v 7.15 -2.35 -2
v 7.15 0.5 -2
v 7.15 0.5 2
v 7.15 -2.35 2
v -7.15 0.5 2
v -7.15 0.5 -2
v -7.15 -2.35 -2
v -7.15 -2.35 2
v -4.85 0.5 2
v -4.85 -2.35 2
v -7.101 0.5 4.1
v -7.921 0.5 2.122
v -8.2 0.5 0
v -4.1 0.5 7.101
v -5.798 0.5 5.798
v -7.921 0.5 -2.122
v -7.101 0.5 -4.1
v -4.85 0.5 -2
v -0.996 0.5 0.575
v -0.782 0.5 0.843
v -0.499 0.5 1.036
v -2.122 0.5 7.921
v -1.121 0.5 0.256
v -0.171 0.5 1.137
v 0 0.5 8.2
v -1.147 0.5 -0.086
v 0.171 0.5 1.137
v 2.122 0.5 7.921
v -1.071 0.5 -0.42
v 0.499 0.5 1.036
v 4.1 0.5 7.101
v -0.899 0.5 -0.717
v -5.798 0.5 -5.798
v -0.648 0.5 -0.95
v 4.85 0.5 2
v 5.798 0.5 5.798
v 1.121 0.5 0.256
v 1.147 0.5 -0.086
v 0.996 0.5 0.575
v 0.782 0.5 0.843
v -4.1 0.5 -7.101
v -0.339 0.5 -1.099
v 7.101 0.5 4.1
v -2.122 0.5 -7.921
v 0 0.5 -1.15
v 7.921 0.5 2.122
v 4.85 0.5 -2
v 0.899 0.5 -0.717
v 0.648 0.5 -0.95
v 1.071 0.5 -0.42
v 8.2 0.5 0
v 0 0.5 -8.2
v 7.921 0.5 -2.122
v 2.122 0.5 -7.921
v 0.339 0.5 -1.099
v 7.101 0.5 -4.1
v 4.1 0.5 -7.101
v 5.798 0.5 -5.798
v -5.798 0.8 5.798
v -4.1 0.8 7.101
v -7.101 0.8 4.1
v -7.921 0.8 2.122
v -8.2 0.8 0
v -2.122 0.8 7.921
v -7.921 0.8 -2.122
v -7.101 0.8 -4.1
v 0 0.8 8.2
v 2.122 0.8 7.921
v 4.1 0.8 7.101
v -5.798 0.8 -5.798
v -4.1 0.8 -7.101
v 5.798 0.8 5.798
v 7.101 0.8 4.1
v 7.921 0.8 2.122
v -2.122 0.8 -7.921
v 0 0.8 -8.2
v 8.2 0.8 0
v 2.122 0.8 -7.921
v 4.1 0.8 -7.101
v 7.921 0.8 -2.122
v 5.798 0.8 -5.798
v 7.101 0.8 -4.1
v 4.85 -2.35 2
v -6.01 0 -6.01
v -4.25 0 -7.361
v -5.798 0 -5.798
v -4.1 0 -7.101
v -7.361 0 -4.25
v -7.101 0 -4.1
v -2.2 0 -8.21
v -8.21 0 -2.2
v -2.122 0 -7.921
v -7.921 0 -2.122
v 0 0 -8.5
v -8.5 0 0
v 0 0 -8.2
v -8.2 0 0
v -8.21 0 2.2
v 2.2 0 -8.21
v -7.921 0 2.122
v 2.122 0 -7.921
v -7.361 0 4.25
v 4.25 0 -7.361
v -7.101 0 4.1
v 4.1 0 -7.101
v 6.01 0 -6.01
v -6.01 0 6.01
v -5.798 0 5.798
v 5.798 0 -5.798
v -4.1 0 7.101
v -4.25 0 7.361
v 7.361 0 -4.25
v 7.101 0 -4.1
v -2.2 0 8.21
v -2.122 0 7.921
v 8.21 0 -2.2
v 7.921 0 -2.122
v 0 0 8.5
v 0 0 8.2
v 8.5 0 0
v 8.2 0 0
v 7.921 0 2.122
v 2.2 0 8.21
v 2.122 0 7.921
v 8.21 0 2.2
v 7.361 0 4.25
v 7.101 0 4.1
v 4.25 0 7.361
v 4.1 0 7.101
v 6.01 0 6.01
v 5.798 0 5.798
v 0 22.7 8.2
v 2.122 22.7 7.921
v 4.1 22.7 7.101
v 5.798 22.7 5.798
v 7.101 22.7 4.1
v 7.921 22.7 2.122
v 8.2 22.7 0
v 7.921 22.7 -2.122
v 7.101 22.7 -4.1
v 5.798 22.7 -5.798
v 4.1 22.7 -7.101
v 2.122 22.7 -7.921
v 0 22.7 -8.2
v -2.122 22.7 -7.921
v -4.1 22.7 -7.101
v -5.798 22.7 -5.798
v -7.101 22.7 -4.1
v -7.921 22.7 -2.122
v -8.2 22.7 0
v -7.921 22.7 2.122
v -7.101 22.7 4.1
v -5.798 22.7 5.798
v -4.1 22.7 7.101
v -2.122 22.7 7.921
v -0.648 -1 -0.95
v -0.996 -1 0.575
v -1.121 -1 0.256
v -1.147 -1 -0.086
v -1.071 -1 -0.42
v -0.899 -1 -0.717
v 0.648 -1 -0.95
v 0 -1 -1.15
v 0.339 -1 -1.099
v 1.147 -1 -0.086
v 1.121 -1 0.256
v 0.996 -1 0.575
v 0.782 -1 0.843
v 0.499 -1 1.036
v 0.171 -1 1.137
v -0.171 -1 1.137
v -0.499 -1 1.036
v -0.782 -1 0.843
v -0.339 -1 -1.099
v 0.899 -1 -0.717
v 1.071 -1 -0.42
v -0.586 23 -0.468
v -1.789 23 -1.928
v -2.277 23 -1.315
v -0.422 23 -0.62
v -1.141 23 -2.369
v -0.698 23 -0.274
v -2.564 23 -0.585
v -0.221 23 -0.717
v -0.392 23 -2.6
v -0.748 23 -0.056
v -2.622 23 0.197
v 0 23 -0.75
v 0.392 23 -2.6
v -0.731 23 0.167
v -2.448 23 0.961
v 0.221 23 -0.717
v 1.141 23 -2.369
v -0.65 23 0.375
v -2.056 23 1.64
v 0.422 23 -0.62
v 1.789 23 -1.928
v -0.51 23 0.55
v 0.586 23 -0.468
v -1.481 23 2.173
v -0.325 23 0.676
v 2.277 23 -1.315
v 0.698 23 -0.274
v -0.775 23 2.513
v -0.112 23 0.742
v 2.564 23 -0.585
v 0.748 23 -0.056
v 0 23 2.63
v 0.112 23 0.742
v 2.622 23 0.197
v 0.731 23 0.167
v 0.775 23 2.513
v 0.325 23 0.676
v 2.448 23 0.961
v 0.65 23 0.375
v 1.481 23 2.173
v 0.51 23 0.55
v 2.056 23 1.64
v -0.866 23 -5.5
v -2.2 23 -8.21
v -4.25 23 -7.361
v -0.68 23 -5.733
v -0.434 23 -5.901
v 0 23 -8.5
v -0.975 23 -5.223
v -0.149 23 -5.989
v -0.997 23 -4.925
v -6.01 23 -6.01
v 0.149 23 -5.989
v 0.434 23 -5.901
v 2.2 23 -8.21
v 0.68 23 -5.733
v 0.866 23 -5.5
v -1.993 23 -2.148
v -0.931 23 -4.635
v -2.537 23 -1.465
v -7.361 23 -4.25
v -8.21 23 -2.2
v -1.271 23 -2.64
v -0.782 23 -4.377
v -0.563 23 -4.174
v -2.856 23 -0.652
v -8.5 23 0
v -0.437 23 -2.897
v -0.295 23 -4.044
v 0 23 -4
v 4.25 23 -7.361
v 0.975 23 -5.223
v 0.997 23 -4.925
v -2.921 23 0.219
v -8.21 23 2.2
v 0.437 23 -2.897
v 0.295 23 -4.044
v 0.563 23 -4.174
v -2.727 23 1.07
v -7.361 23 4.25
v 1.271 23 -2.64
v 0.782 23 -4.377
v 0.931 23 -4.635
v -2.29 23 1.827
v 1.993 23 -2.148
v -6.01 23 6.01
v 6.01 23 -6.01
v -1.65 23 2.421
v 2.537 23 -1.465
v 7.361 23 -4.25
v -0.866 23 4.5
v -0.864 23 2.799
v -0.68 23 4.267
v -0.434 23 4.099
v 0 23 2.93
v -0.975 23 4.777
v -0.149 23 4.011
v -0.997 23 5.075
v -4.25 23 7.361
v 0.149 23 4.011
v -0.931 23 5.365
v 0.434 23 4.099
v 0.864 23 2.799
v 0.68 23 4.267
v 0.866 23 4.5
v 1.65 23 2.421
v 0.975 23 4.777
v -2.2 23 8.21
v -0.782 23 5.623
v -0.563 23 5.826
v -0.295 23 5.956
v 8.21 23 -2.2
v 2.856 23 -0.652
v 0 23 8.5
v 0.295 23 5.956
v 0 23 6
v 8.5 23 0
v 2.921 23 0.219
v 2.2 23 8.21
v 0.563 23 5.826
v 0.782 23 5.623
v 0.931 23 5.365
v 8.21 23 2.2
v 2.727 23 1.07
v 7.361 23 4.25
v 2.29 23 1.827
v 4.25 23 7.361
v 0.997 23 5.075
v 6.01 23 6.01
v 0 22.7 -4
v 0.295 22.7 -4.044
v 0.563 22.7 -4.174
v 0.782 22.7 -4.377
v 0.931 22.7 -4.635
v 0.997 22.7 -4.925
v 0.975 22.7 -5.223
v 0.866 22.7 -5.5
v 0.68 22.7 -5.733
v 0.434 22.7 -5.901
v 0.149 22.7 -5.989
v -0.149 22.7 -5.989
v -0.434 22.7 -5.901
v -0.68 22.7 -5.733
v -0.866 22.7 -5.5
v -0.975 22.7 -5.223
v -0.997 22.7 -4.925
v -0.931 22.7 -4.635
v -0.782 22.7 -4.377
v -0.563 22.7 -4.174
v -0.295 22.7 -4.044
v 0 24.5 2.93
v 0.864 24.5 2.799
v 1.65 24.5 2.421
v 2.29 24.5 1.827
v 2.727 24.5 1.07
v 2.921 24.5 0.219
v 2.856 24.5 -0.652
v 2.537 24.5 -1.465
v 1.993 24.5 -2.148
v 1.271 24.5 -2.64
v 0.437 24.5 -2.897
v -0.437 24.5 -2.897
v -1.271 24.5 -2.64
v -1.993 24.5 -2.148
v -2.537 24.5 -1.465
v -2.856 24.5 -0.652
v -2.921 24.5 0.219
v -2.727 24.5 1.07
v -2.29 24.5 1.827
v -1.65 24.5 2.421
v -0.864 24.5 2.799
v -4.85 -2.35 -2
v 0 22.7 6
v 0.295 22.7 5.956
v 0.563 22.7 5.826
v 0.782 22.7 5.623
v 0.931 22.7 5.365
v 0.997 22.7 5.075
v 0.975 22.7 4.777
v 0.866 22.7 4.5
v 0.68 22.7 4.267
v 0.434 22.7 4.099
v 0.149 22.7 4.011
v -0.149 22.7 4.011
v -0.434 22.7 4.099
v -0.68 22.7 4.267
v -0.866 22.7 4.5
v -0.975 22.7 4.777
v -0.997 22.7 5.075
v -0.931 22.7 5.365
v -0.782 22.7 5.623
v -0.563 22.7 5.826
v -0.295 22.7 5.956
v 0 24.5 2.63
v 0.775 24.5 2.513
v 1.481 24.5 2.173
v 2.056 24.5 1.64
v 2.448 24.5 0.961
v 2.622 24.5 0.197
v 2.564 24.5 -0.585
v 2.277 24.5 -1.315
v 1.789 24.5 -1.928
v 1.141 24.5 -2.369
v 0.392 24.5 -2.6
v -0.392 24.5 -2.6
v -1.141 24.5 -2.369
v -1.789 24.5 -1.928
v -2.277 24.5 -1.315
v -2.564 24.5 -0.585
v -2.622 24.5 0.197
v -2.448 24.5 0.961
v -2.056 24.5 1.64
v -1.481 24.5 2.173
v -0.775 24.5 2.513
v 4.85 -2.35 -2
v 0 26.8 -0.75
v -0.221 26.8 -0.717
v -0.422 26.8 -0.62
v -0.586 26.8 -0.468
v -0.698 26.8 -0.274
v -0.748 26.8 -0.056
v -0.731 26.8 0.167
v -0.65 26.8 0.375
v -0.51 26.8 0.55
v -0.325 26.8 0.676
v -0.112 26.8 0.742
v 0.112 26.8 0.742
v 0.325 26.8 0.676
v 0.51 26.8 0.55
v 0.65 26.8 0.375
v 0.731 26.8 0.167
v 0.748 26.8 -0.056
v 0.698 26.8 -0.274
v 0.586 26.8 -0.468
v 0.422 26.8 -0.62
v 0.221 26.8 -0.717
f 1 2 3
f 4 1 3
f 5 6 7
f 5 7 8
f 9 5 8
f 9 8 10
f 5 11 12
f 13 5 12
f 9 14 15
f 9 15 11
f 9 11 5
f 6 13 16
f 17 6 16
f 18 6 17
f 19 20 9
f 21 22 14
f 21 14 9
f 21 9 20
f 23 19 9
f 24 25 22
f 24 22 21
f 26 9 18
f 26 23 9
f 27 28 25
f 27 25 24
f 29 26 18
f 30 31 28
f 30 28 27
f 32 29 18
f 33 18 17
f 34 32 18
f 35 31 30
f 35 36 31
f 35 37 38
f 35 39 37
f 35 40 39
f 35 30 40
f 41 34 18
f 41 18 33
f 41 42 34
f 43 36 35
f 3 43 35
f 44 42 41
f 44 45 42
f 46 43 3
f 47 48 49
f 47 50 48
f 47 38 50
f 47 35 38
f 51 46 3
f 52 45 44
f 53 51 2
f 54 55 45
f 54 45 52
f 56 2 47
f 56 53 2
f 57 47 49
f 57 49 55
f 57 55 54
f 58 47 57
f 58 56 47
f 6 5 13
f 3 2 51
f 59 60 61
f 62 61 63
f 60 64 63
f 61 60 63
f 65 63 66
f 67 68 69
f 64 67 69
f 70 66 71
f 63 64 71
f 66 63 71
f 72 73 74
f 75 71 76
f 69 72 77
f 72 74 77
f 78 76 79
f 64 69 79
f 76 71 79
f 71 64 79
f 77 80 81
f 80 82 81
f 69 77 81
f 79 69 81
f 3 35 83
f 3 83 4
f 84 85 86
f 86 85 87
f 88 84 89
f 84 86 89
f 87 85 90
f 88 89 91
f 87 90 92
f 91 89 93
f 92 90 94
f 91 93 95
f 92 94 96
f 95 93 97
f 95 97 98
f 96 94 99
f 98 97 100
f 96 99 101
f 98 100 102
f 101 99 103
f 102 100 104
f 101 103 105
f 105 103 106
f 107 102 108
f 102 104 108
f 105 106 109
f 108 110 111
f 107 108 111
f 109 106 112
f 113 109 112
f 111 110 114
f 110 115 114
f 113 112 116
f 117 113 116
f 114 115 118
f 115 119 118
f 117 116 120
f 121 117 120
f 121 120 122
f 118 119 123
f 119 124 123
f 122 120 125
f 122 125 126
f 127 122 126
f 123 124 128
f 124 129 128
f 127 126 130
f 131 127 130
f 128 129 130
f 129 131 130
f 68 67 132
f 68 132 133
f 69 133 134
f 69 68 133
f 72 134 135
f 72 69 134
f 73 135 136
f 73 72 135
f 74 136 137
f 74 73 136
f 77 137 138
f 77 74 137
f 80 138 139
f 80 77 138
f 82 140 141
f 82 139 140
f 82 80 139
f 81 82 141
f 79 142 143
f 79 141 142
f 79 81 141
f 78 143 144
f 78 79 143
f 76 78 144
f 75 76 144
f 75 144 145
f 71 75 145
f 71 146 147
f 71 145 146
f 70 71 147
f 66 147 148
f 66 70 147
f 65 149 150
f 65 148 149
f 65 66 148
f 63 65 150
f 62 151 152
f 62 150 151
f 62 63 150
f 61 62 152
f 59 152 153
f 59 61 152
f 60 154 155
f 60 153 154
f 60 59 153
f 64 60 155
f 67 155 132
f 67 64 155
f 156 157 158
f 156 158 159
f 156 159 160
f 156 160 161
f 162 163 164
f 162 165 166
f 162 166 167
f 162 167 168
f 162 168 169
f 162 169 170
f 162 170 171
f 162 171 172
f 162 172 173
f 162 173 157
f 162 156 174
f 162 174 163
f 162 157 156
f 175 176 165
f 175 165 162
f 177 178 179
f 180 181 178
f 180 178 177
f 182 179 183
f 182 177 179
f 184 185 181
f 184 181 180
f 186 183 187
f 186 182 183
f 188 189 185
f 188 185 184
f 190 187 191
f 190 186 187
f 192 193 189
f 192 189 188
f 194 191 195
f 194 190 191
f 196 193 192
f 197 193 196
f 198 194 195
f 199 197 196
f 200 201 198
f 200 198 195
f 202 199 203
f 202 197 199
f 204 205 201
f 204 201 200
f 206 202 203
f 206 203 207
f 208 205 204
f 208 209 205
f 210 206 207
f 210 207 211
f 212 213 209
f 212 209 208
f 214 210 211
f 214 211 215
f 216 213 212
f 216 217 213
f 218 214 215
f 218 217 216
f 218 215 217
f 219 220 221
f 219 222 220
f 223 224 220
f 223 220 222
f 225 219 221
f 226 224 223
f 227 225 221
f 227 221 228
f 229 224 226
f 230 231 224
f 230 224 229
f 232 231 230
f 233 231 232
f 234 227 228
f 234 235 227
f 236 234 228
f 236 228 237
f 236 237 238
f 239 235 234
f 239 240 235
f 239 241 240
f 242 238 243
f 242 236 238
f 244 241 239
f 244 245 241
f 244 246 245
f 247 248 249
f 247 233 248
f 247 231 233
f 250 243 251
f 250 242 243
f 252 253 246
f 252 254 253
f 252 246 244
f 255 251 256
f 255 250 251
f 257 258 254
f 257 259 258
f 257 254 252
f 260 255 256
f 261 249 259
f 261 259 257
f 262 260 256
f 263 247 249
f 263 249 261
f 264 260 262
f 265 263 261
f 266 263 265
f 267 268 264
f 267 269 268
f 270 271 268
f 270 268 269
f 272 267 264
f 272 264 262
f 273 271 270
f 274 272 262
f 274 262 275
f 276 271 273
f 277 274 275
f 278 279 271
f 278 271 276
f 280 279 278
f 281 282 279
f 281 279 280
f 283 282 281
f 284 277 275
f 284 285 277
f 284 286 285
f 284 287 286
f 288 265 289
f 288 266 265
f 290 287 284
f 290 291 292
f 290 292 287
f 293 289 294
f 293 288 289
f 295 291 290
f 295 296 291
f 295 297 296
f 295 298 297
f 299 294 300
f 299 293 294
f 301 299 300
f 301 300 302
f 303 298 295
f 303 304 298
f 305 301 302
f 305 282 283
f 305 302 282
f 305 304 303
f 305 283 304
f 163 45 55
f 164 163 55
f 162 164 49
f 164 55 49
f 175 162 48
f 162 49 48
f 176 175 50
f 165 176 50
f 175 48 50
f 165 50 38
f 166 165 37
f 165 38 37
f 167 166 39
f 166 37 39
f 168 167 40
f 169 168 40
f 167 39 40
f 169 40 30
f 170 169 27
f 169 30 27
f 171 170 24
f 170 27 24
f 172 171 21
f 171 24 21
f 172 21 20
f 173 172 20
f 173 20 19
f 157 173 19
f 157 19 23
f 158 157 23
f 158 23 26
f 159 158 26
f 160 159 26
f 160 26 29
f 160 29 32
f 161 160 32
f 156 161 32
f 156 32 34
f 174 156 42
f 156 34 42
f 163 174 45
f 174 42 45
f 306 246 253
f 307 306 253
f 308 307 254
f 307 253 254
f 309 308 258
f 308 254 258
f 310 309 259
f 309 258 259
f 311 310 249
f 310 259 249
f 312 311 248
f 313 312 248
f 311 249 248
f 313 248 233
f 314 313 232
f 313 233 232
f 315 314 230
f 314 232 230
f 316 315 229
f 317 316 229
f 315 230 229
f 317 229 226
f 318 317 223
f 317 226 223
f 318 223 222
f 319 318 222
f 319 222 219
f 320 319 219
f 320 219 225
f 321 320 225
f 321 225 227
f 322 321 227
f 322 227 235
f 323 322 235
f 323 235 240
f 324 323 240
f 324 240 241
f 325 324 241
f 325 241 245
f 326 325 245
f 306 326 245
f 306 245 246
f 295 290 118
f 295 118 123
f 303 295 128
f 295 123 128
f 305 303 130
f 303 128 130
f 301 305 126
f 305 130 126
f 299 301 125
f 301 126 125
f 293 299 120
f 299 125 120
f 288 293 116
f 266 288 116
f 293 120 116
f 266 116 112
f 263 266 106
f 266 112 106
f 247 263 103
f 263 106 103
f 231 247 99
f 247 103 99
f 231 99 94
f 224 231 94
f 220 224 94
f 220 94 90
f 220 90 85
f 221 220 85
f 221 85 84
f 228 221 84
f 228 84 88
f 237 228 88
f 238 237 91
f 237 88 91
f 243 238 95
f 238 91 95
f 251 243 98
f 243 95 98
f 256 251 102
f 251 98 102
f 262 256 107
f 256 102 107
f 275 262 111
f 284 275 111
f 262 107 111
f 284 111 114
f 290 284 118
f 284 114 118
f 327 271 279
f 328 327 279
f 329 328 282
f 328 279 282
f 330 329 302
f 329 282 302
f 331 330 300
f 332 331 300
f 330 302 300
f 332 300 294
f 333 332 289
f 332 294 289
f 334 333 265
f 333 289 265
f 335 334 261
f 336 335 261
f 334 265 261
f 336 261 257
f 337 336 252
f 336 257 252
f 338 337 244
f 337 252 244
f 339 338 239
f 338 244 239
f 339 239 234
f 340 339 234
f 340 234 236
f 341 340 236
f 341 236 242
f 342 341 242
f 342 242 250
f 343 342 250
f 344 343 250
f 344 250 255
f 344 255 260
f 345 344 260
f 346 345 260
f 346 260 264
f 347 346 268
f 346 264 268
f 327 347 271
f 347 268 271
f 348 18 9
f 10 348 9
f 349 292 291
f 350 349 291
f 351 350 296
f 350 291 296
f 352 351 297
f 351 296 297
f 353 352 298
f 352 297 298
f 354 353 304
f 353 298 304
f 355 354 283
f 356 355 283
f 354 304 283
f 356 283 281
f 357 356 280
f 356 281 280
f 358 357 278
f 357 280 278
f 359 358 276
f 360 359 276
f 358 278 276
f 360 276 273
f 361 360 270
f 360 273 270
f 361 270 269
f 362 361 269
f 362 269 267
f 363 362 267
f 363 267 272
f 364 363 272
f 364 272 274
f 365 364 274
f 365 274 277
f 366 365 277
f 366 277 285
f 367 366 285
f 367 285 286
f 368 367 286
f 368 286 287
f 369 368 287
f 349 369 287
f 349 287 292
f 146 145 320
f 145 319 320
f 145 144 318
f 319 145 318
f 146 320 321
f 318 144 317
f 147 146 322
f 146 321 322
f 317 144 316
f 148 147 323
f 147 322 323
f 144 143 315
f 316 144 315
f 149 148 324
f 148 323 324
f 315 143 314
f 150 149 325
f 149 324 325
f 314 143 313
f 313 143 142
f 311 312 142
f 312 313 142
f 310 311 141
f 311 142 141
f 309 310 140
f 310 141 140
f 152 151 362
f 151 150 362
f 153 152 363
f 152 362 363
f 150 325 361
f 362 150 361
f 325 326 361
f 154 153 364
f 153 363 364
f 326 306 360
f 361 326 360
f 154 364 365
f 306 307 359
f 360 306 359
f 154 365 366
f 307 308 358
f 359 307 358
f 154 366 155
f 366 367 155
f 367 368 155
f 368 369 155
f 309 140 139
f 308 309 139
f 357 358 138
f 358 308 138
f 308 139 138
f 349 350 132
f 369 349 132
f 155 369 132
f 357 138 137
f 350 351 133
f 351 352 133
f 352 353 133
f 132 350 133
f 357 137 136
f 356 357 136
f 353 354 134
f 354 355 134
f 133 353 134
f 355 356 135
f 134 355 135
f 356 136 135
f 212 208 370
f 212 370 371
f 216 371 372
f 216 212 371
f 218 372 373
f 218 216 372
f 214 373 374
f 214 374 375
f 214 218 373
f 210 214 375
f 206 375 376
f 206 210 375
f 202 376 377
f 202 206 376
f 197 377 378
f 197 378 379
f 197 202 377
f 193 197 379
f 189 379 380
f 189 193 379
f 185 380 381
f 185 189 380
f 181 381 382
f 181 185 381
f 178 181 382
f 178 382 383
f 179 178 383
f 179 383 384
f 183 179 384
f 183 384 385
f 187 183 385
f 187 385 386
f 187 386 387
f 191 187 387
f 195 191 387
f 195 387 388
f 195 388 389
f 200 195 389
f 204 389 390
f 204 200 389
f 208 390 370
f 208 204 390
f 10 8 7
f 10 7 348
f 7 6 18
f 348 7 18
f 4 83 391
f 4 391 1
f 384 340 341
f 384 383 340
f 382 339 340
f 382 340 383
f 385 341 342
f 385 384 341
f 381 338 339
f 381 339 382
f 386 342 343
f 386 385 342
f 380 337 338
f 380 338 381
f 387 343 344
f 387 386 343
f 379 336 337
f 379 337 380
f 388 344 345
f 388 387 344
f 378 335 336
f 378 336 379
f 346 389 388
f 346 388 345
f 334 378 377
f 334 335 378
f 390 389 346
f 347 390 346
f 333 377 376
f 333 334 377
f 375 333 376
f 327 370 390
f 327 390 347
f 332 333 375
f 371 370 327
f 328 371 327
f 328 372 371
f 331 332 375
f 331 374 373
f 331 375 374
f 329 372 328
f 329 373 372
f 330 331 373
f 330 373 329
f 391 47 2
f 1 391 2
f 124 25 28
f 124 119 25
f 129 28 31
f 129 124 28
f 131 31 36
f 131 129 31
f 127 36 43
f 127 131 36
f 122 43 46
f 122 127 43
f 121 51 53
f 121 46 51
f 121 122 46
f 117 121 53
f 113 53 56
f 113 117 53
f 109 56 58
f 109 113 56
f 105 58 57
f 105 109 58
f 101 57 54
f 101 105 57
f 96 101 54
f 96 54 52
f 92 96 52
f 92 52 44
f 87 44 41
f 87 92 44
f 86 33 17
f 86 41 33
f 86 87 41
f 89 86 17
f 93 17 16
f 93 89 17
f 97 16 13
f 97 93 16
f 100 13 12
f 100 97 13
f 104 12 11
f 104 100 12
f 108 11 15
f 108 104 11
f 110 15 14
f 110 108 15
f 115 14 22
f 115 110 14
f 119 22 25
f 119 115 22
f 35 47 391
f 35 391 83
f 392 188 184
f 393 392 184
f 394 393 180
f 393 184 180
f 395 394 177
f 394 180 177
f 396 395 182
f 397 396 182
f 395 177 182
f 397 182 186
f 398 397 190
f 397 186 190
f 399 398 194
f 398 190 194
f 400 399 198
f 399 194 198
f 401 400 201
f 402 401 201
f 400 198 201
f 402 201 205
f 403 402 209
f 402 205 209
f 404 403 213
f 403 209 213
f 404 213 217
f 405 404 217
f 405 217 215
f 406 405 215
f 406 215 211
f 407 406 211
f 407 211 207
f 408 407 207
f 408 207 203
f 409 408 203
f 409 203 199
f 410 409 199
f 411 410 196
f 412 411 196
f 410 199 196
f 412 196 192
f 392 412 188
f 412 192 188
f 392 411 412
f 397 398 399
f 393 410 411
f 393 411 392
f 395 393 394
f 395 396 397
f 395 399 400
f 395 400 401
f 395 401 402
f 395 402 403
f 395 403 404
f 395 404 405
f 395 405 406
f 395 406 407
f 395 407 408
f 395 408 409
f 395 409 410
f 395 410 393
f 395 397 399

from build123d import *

# Parameters (mm, degrees)
SKETCH1_R           = 8.5
BOSS_EXTRUDE1_DEPTH = 23
SHELL3_T            = -0.3
SKETCH2_R           = 8.2
BOSS_EXTRUDE2_DEPTH = 0.3
SKETCH3_R           = 1.15
BOSS_EXTRUDE3_DEPTH = 1.5
SKETCH4_R           = 2.929639603
SKETCH4_R_2         = 2.629639603
BOSS_EXTRUDE4_DEPTH = 1.5
SKETCH5_R           = 0.75
BOSS_EXTRUDE5_DEPTH = 3.8
CUT_EXTRUDE1_REACH  = 28.842
SKETCH7_R           = 1
SKETCH8_W           = 2.3
SKETCH8_H           = 4
BOSS_EXTRUDE7_DEPTH = 2.85


with BuildPart() as part:
    # Sketch1 → Boss-Extrude1 (new body)
    with BuildSketch(Plane(origin=(0, 0, 0), x_dir=(1, 0, 0), z_dir=(0, 1, 0))):
        with Locations(Location((0, 0, 0), (0, 0, 270))):
            Circle(SKETCH1_R)
    extrude(amount=BOSS_EXTRUDE1_DEPTH)

    # Shell3
    shell3_openings = [part.faces().sort_by_distance(p)[0] for p in [
        (0, 0, 0),
    ]]
    offset(amount=SHELL3_T, openings=shell3_openings, kind=Kind.INTERSECTION)

    # Sketch2 → Boss-Extrude2 (add)
    with BuildSketch(Plane(origin=(0, 0.5, 0), x_dir=(-1, 0, 0), z_dir=(0, -1, 0))):
        with Locations(Location((0, 0, 0), (0, 0, 90))):
            Circle(SKETCH2_R)
    extrude(amount=-BOSS_EXTRUDE2_DEPTH)

    # Sketch3 → Boss-Extrude3 (add)
    with BuildSketch(Plane.XZ.offset(-0.5)):
        with Locations(Location((0, 0, 0), (0, 0, 270))):
            Circle(SKETCH3_R)
    extrude(amount=BOSS_EXTRUDE3_DEPTH)

    # Sketch4 → Boss-Extrude4 (add)
    with BuildSketch(Plane(origin=(0, 23, 0), x_dir=(1, 0, 0), z_dir=(0, 1, 0))):
        with Locations(Location((0, 0, 0), (0, 0, 270))):
            Circle(SKETCH4_R)
        with Locations(Location((0, 0, 0), (0, 0, 270))):
            Circle(SKETCH4_R_2, mode=Mode.SUBTRACT)
    extrude(amount=BOSS_EXTRUDE4_DEPTH)

    # Sketch5 → Boss-Extrude5 (add)
    with BuildSketch(Plane(origin=(0, 23, 0), x_dir=(1, 0, 0), z_dir=(0, 1, 0))):
        with Locations(Location((0, 0, 0), (0, 0, 90))):
            Circle(SKETCH5_R)
    extrude(amount=BOSS_EXTRUDE5_DEPTH)

    # Sketch7 → Cut-Extrude1 (cut, up to next)
    with BuildSketch(Plane(origin=(0, 23, 0), x_dir=(1, 0, 0), z_dir=(0, 1, 0)), mode=Mode.PRIVATE) as cut_extrude1_sk1:
        with Locations(Location((0, 5, 0), (0, 0, 270))):
            Circle(SKETCH7_R)
    cut_extrude1_tool1 = extrude(cut_extrude1_sk1.sketch, amount=-CUT_EXTRUDE1_REACH, mode=Mode.PRIVATE) & part.part
    # Sketch7 → Cut-Extrude1 (cut, up to next)
    with BuildSketch(Plane(origin=(0, 23, 0), x_dir=(1, 0, 0), z_dir=(0, 1, 0)), mode=Mode.PRIVATE) as cut_extrude1_sk2:
        with Locations(Location((0, -5, 0), (0, 0, 270))):
            Circle(SKETCH7_R)
    cut_extrude1_tool2 = extrude(cut_extrude1_sk2.sketch, amount=-CUT_EXTRUDE1_REACH, mode=Mode.PRIVATE) & part.part
    add(cut_extrude1_tool1.solids().sort_by_distance((0, 23, -5))[0], mode=Mode.SUBTRACT)
    add(cut_extrude1_tool2.solids().sort_by_distance((0, 23, 5))[0], mode=Mode.SUBTRACT)

    # Sketch8 → Boss-Extrude7 (add)
    with BuildSketch(Plane.XZ.offset(-0.5)):
        with Locations((-6, 0)):
            Rectangle(SKETCH8_W, SKETCH8_H)
        with Locations((6, 0)):
            Rectangle(SKETCH8_W, SKETCH8_H)
    extrude(amount=BOSS_EXTRUDE7_DEPTH)


solid = part.part
